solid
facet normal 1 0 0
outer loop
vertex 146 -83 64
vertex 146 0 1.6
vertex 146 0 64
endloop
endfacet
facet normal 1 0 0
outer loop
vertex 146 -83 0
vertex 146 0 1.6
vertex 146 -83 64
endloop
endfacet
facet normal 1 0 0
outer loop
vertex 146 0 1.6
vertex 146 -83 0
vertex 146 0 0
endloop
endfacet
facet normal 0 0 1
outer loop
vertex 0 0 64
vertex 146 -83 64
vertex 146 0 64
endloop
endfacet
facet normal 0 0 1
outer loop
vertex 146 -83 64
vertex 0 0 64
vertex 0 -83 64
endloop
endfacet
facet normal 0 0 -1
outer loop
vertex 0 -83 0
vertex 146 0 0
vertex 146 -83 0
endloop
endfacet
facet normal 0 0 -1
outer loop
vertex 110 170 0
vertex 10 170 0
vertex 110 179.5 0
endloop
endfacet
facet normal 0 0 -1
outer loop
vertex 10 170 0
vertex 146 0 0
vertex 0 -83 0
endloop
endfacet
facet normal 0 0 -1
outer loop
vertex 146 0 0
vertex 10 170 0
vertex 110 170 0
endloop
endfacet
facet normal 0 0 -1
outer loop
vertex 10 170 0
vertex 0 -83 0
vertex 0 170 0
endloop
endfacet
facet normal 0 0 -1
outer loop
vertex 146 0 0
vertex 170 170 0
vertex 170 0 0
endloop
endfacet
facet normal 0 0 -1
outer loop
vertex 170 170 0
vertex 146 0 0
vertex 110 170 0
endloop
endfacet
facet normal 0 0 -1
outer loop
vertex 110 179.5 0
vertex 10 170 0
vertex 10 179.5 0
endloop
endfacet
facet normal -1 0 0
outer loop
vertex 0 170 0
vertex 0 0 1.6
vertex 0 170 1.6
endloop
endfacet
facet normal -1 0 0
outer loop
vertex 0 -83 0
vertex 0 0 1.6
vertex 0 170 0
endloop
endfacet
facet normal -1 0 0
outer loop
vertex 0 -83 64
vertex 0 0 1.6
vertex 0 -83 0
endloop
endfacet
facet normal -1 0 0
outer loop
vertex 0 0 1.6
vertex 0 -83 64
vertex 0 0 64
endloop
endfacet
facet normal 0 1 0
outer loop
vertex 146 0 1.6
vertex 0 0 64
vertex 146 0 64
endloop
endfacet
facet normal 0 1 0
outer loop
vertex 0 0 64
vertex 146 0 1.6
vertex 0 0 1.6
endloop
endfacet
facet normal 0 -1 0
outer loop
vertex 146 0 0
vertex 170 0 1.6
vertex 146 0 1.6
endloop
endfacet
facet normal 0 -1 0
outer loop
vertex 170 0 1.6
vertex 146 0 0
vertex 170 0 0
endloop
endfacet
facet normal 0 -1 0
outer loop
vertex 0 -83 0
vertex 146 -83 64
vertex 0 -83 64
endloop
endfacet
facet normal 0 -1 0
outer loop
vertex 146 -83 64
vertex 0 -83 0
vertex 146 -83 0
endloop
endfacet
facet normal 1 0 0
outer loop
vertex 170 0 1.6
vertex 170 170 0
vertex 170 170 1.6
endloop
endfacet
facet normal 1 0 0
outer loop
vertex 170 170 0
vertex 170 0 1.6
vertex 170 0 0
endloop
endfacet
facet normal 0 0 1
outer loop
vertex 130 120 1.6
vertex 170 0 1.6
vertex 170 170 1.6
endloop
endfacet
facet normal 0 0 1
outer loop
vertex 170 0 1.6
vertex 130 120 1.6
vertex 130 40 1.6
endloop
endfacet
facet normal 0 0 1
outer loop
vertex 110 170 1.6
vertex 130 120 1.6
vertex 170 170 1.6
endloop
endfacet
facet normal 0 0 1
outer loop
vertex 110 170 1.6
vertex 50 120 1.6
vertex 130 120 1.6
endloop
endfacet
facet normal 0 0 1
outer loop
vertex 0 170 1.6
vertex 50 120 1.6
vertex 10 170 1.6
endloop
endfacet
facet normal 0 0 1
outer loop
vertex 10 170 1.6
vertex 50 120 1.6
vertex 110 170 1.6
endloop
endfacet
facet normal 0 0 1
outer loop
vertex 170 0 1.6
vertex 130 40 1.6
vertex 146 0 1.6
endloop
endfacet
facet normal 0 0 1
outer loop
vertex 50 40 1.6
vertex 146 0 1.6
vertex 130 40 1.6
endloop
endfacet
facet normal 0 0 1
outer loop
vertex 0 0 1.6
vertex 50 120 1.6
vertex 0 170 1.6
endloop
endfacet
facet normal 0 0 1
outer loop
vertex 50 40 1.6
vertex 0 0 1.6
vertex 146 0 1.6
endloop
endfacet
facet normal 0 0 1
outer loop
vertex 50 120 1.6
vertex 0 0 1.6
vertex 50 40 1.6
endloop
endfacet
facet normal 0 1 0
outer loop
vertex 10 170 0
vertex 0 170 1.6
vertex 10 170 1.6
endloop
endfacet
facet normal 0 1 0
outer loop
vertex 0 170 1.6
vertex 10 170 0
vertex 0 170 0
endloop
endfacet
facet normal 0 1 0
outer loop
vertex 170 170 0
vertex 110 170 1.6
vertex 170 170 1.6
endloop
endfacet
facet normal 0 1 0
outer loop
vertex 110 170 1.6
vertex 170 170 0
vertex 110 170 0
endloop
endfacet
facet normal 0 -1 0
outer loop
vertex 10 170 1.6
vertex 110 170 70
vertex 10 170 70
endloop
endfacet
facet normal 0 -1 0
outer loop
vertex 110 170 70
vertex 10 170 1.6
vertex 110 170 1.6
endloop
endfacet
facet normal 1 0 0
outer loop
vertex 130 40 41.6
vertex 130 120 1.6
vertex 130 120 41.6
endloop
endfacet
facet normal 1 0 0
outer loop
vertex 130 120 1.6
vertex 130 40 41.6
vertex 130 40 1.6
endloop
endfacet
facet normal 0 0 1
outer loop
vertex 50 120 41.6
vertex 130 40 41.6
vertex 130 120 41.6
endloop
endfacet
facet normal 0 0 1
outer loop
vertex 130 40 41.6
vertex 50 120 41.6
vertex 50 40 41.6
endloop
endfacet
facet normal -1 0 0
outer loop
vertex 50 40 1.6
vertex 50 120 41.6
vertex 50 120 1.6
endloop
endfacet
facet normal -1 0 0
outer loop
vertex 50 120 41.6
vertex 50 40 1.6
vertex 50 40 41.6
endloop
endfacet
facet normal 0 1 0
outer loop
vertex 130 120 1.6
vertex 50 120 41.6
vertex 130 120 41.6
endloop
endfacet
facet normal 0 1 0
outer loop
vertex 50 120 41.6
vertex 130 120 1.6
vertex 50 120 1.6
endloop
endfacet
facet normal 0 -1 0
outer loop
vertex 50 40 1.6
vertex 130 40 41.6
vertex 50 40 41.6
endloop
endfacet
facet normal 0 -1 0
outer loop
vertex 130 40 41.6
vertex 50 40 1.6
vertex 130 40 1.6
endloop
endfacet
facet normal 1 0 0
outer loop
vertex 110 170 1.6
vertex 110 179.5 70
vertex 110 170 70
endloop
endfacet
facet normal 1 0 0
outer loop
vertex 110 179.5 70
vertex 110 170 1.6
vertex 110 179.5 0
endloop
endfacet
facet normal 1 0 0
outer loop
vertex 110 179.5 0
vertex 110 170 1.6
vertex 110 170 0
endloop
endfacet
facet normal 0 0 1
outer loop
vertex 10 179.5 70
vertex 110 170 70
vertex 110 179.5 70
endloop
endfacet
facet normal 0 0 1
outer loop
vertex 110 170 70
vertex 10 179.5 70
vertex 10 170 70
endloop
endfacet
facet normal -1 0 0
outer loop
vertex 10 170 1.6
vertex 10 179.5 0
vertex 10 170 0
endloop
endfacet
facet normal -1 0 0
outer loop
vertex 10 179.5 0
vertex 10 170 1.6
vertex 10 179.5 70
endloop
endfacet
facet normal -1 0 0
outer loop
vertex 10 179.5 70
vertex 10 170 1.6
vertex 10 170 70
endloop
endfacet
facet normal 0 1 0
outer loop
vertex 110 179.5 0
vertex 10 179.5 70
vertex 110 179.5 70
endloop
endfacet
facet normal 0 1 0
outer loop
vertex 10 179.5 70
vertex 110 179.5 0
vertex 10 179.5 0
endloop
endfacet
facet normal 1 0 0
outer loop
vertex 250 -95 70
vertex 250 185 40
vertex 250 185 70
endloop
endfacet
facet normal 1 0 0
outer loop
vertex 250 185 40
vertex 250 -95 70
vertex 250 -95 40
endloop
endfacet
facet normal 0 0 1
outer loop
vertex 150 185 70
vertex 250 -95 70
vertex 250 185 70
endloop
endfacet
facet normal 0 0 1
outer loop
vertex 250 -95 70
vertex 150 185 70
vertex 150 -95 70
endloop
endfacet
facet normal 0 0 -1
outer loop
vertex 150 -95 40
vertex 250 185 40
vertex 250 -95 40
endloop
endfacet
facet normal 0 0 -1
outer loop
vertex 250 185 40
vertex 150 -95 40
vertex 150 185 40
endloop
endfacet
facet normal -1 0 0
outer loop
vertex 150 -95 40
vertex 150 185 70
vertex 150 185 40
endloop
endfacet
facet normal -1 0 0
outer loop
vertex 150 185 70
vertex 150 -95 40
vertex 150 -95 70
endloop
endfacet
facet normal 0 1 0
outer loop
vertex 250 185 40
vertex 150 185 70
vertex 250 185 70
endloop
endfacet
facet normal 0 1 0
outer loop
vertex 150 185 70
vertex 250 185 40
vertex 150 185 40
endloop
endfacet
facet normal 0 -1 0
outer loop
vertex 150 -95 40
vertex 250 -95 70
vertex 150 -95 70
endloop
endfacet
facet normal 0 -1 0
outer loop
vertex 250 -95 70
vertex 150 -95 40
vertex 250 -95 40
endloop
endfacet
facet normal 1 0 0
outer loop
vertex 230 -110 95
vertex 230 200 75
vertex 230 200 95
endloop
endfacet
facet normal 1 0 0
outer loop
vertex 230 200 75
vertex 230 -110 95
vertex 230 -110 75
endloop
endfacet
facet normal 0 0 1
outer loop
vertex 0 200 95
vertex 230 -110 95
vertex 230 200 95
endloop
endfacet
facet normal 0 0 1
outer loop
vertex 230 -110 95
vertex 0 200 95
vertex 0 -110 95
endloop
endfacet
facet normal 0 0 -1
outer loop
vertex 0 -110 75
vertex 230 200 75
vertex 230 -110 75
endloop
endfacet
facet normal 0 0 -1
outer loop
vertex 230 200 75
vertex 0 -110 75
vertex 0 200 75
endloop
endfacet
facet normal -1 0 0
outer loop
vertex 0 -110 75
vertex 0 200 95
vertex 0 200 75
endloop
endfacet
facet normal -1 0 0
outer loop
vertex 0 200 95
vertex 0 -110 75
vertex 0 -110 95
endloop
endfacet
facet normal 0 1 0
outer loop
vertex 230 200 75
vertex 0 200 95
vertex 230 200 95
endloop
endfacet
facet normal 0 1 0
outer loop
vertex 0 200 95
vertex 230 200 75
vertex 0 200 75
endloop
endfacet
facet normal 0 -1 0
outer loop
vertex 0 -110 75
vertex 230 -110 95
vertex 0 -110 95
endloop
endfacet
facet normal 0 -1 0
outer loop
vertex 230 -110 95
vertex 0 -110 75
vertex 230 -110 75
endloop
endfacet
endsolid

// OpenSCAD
//PSU
translate([0,-83,0])
	color([0, 0, 0])
		cube([146, 83, 64]);

//Motherboard
color([.3,.6,.3])
	cube([170,170,1.6]);

//Cooler
translate([50,40,1.6])
	color([.9,.9,.9])
		cube([80,80,40]);

//SSD
translate([10,170,0])
	color([.9,.9,.9])
		cube([100,9.5,70]);

//Keyboard
translate([150,-95,40])
	color([0, 0, 0])
		cube([100, 280, 30]);

//screen
translate([0,-110,75])
	color([1, 0, 0])
		cube([230, 310, 20]);
